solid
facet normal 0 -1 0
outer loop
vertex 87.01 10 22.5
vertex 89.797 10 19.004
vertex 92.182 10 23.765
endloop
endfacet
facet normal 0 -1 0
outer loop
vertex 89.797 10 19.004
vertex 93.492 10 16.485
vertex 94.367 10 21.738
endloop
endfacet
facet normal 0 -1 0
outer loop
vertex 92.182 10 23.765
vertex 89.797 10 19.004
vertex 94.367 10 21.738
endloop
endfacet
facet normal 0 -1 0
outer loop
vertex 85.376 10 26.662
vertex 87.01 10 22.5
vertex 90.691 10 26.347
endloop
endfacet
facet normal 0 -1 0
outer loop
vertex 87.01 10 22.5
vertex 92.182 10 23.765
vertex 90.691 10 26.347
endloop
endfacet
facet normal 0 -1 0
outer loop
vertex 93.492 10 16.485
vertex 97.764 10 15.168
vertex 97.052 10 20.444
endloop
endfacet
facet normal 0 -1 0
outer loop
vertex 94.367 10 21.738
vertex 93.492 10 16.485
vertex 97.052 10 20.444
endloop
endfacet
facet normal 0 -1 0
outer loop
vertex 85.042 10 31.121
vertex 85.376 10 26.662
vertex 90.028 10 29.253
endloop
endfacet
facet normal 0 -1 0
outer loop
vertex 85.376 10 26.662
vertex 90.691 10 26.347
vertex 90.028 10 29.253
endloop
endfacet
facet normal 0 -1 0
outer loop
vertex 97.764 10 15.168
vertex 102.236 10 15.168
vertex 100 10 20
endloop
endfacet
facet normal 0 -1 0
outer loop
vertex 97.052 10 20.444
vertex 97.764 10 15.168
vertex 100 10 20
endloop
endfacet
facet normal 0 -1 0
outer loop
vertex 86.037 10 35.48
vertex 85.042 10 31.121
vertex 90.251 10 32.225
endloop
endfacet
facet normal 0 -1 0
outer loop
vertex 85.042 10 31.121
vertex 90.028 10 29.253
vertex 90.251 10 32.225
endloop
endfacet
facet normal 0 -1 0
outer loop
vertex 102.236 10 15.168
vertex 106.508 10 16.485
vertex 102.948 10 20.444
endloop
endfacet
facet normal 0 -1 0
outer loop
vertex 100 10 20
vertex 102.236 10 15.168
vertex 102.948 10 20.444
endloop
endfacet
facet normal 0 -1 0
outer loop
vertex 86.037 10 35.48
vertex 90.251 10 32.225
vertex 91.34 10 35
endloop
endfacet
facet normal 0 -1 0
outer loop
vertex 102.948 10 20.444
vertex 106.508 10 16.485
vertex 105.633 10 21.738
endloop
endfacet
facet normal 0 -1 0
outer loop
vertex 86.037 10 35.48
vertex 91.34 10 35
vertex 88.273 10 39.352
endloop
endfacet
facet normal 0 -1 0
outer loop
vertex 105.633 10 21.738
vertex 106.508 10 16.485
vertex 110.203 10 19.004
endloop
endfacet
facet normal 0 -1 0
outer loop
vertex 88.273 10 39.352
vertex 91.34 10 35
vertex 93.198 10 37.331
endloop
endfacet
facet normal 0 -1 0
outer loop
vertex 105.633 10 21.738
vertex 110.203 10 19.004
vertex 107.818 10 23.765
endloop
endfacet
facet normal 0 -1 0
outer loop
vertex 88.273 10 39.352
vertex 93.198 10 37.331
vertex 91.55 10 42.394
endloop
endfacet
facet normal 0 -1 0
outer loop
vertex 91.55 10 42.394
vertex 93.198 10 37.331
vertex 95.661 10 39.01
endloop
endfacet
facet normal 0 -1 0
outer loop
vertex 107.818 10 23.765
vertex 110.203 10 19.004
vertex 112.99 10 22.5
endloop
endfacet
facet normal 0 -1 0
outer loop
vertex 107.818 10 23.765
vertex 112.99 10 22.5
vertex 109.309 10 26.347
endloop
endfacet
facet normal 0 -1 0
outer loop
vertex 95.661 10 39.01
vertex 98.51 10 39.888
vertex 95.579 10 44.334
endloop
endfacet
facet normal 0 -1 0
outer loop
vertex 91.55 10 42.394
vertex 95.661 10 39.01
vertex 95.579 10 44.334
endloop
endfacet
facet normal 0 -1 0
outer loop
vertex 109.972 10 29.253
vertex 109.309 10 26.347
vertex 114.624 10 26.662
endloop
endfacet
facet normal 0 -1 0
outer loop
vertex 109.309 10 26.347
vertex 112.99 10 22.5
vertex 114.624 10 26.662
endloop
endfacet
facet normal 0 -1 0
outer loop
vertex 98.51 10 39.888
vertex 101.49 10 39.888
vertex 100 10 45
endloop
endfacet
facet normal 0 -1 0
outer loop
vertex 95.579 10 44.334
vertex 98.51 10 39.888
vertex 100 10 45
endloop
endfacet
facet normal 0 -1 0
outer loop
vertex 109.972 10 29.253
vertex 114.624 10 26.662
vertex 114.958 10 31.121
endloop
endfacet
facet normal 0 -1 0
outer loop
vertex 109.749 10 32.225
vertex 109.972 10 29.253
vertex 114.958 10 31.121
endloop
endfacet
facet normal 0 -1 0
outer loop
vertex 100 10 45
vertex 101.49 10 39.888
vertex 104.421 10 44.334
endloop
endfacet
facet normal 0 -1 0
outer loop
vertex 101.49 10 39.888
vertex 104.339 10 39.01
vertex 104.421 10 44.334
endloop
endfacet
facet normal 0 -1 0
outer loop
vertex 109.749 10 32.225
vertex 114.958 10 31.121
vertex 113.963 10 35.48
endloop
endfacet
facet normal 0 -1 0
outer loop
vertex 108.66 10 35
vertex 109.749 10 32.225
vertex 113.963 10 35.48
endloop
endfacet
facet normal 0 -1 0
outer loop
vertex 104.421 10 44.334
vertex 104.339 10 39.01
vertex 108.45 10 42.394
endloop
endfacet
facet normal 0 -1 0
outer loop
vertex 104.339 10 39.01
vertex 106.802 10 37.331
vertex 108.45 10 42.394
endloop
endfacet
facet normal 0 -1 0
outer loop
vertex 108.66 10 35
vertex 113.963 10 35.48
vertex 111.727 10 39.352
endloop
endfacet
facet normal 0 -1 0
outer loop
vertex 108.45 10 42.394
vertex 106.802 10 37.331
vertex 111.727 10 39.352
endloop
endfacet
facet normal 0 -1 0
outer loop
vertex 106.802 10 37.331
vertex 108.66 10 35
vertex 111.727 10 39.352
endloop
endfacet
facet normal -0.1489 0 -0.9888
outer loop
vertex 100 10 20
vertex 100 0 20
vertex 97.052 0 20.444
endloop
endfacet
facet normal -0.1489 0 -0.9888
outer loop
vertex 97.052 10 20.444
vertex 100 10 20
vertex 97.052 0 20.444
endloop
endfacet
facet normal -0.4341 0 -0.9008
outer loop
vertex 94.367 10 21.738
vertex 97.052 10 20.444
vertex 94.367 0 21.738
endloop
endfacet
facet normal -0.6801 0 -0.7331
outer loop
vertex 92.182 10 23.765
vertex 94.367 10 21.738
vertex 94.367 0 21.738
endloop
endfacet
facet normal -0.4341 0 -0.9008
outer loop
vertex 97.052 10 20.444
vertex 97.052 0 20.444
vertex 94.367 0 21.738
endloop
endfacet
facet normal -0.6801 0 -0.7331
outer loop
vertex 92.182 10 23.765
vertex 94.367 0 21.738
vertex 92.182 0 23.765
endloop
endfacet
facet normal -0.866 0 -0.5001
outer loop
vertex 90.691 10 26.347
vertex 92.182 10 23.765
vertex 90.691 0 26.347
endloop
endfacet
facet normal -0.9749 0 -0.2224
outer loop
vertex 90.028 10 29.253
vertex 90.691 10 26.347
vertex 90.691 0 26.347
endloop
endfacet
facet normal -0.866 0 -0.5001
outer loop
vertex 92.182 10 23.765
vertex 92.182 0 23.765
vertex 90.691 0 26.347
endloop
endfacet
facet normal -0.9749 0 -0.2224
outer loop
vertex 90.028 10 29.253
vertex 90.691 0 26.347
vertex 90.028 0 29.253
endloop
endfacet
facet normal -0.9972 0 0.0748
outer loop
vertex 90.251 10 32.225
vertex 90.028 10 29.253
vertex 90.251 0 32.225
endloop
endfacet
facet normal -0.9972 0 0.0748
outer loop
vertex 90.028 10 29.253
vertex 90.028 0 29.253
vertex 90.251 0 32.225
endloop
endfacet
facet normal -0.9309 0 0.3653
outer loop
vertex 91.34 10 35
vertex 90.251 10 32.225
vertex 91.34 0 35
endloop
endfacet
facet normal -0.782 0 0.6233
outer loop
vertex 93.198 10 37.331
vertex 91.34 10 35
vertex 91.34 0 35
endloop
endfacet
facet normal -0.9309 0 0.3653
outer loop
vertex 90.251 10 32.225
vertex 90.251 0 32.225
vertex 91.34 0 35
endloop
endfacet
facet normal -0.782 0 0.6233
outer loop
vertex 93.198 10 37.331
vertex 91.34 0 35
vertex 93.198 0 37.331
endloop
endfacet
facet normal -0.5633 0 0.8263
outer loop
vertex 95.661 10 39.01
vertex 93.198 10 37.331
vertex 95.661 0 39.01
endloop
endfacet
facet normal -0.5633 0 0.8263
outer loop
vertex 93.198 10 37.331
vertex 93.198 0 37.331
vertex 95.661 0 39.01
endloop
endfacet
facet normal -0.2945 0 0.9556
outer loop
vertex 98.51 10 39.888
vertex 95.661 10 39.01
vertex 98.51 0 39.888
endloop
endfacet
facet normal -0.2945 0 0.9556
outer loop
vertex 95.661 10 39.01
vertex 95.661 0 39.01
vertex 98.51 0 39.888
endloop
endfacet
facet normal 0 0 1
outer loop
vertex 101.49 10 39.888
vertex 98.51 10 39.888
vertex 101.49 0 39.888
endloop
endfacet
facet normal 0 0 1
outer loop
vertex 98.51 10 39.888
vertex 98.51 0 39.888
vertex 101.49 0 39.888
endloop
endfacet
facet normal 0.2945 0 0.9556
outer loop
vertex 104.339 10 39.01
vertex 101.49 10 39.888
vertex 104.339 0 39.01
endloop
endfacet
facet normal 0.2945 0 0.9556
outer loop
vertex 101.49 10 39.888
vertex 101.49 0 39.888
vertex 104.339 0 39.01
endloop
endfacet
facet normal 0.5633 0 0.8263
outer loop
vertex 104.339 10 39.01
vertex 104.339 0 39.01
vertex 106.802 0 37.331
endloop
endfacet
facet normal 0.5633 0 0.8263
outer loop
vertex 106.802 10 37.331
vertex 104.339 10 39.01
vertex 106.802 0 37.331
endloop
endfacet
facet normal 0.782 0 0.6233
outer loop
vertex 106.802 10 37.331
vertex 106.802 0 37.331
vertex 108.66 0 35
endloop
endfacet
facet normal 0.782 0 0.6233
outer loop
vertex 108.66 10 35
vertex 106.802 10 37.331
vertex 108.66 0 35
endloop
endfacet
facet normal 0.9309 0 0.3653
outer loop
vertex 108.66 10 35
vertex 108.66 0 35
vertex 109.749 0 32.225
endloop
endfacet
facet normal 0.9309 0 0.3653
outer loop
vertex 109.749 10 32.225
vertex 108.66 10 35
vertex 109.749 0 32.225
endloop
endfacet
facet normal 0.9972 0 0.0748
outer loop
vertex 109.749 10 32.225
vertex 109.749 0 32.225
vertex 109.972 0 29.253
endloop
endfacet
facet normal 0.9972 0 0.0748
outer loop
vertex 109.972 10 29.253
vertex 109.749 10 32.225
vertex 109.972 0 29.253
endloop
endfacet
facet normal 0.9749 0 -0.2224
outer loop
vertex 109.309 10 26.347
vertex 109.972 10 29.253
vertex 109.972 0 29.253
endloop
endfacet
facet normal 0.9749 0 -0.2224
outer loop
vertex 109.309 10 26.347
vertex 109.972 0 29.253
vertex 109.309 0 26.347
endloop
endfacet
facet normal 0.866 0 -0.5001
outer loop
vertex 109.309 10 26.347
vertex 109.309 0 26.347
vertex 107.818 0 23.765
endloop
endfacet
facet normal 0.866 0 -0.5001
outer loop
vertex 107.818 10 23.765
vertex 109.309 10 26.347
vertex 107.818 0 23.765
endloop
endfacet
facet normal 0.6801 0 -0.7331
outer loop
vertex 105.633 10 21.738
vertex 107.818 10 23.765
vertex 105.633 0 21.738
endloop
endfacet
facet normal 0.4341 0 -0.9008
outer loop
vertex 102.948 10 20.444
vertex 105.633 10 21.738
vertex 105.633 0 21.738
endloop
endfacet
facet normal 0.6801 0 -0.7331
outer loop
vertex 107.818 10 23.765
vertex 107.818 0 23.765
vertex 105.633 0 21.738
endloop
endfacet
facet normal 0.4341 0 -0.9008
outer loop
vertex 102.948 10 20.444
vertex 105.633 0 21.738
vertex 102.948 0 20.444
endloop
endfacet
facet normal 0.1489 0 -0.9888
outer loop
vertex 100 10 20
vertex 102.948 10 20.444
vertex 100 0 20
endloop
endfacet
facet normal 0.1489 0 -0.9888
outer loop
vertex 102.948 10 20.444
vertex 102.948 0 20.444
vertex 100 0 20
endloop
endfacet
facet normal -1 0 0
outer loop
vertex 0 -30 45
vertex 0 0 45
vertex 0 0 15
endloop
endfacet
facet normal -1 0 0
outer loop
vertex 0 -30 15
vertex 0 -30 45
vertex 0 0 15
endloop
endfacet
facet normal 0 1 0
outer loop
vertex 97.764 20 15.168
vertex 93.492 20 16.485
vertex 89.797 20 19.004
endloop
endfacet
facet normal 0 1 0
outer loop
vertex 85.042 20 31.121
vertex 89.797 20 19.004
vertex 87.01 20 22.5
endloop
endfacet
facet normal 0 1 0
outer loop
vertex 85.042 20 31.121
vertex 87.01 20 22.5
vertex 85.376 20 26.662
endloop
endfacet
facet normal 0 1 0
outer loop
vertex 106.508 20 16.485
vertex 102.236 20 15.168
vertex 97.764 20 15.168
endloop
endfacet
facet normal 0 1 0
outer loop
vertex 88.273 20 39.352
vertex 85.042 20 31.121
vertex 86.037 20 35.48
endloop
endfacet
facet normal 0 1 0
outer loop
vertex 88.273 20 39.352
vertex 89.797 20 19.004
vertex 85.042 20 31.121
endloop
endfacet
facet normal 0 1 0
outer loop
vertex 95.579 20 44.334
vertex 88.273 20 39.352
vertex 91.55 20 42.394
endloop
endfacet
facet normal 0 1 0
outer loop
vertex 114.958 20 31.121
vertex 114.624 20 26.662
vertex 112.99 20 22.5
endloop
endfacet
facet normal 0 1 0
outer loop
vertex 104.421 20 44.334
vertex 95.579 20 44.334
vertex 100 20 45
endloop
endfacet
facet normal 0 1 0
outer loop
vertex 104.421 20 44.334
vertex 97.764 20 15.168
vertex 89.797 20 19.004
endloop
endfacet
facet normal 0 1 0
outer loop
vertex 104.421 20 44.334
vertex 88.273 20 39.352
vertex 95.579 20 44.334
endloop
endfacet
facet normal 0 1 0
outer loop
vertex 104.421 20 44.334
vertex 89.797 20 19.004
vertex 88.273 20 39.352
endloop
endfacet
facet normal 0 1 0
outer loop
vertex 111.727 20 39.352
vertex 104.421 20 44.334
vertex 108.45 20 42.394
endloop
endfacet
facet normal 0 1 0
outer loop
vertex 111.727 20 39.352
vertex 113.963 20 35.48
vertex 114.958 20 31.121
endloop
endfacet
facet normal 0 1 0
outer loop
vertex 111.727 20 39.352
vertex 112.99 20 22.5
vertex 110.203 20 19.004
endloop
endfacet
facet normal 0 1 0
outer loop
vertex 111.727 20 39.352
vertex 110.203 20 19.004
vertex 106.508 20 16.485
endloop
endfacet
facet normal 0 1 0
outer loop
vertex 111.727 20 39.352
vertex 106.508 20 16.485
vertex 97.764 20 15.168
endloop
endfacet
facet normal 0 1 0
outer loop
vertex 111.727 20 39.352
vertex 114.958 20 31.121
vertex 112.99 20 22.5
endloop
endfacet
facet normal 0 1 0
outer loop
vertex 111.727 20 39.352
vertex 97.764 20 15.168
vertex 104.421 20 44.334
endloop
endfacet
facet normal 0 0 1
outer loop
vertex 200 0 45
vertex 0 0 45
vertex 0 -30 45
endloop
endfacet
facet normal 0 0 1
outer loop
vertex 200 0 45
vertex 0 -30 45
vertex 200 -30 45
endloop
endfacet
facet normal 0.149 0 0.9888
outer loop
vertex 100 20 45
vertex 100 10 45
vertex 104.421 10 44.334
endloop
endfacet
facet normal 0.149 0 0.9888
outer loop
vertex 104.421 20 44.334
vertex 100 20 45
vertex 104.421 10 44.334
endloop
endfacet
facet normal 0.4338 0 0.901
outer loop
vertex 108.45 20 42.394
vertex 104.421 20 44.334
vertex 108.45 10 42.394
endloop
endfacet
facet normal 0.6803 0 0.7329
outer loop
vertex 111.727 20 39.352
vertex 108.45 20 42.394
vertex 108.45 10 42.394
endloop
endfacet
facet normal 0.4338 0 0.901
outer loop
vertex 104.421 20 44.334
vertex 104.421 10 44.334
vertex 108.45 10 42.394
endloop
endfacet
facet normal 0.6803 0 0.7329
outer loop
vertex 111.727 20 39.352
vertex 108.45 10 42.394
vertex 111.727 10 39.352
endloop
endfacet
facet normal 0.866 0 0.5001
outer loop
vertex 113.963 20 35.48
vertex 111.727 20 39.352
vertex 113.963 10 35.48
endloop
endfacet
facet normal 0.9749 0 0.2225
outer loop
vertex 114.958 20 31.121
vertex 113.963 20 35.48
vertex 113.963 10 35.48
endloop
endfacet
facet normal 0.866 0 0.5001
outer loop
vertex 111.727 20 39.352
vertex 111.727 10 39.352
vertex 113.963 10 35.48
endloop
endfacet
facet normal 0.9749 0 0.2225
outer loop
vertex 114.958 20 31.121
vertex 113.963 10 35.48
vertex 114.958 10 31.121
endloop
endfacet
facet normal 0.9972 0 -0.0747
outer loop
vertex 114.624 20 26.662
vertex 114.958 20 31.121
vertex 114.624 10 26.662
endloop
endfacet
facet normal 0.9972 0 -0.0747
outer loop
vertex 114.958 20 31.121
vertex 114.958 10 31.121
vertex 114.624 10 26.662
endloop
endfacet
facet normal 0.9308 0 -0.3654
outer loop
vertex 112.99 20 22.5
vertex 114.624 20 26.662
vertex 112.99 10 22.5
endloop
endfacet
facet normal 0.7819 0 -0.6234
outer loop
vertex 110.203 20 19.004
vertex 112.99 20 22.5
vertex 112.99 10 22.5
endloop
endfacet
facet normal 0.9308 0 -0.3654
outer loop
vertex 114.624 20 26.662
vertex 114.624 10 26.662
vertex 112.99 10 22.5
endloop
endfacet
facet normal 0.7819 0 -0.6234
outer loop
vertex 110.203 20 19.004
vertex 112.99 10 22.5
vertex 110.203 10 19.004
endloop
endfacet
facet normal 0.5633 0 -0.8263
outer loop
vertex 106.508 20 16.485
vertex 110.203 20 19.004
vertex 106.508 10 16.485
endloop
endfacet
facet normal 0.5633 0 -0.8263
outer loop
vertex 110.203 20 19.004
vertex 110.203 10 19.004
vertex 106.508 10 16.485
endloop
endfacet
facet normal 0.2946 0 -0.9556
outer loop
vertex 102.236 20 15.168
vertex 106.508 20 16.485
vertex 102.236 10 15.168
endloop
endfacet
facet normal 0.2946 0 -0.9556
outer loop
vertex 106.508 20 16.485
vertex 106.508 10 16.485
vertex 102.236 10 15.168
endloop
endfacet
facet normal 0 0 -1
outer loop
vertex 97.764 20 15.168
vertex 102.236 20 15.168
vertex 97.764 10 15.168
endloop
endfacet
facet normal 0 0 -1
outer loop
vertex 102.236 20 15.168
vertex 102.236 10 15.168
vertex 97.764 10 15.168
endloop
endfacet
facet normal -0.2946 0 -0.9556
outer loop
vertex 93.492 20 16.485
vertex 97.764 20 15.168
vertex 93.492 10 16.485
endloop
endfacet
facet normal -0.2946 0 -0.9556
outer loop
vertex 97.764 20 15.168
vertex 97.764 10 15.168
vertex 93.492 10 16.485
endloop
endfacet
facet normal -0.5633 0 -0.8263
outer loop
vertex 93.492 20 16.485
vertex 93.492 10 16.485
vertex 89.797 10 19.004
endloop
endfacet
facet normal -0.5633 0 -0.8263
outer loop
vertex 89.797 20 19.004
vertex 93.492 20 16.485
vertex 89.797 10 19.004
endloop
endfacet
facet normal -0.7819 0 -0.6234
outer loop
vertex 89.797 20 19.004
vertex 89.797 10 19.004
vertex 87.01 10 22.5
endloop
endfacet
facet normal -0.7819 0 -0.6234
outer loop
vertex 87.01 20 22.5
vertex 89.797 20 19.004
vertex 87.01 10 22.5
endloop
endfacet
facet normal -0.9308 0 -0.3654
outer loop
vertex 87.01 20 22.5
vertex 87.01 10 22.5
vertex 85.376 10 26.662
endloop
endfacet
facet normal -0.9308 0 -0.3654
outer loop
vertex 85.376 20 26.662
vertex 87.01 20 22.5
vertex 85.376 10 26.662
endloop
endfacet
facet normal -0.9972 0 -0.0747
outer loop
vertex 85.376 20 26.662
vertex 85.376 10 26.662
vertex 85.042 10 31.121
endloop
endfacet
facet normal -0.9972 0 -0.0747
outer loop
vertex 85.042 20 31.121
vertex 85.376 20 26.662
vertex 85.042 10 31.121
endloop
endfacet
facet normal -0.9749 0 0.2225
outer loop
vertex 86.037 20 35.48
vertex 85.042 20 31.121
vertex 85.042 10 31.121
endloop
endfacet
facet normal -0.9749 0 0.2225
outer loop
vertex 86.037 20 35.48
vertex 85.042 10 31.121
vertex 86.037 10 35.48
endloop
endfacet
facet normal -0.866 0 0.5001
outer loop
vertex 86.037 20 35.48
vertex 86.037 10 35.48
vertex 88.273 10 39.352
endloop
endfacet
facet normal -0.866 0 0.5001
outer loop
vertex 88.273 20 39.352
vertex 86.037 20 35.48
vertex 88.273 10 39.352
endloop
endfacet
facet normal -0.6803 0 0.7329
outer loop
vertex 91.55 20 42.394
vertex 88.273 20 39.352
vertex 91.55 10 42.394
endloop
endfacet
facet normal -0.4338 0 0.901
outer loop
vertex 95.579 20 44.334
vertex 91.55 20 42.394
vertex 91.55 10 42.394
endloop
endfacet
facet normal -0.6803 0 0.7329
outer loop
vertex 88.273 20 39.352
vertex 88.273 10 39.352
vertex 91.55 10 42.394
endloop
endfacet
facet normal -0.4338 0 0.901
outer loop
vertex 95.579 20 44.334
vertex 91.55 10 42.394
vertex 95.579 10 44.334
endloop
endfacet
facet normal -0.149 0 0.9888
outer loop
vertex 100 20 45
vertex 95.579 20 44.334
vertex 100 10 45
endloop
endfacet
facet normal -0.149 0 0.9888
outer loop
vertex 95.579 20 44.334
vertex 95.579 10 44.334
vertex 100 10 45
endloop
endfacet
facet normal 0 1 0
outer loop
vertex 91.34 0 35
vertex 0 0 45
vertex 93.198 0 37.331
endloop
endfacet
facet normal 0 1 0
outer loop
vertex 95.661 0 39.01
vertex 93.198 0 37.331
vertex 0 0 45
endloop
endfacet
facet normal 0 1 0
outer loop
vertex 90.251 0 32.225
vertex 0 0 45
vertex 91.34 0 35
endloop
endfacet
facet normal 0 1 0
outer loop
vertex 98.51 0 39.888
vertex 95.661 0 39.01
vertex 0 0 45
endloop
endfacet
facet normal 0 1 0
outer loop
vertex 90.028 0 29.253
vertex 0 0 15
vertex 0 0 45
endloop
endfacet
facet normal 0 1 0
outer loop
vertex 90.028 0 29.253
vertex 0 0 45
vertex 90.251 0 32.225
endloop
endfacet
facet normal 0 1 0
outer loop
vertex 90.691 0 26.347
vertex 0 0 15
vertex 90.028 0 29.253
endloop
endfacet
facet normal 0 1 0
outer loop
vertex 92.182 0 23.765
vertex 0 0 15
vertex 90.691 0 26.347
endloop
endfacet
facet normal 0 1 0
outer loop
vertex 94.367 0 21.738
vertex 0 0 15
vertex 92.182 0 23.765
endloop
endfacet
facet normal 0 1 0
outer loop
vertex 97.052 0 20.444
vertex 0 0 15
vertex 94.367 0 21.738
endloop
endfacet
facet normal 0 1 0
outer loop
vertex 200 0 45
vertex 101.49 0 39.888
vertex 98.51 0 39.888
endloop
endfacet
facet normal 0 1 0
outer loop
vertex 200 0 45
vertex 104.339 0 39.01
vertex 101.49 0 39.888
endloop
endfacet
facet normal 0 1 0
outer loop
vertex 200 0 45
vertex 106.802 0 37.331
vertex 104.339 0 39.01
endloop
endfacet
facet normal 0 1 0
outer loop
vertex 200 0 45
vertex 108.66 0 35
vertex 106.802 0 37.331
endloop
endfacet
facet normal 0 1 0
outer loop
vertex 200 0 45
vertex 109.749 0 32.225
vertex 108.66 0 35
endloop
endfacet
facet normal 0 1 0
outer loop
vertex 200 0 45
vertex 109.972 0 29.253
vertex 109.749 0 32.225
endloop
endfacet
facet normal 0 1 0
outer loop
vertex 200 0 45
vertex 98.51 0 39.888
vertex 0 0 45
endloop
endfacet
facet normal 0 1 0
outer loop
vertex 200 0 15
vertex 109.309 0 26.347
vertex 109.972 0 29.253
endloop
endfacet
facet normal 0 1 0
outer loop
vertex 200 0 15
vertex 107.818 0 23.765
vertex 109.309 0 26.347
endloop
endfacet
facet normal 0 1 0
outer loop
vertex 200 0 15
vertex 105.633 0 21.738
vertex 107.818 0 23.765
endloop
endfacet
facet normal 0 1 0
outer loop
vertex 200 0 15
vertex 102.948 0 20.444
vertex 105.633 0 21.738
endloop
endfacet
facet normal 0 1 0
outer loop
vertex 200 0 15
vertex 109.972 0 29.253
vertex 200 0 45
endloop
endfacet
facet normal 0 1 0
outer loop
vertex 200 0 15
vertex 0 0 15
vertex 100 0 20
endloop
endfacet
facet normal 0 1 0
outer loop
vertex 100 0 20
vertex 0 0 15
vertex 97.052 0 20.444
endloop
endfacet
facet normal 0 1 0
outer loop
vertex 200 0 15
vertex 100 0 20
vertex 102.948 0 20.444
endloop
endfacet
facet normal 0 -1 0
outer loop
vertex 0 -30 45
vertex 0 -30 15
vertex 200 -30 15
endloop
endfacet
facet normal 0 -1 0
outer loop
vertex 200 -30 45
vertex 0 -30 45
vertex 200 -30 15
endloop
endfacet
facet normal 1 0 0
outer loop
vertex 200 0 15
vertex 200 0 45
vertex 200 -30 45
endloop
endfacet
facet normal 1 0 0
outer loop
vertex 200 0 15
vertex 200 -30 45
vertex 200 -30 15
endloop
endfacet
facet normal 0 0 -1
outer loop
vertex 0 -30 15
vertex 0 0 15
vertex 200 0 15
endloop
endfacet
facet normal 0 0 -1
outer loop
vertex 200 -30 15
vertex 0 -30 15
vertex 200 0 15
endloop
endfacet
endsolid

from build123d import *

# Parameters (mm, degrees)
SKETCH1_W           = 200
SKETCH1_H           = 60
BOSS_EXTRUDE1_DEPTH = 30
SKETCH2_R           = 10
BOSS_EXTRUDE3_DEPTH = 10
SKETCH3_R           = 15
BOSS_EXTRUDE4_DEPTH = 10
SKETCH4_W           = 200
SKETCH4_H           = 15
CUT_EXTRUDE1_DEPTH  = 50


with BuildPart() as part:
    # Sketch1 → Boss-Extrude1 (new body)
    with BuildSketch(Plane(origin=(0, 0, 0), x_dir=(1, 0, 0), z_dir=(0, 1, 0))):
        with Locations((100, -30)):
            Rectangle(SKETCH1_W, SKETCH1_H)
    extrude(amount=-BOSS_EXTRUDE1_DEPTH)

    # Sketch2 → Boss-Extrude3 (add)
    with BuildSketch(Plane(origin=(0, 0, 0), x_dir=(1, 0, 0), z_dir=(0, 1, 0))):
        with Locations(Location((100, -30, 0), (0, 0, 90))):
            Circle(SKETCH2_R)
    extrude(amount=BOSS_EXTRUDE3_DEPTH)

    # Sketch3 → Boss-Extrude4 (add)
    with BuildSketch(Plane(origin=(0, 10, 0), x_dir=(1, 0, 0), z_dir=(0, 1, 0))):
        with Locations(Location((100, -30, 0), (0, 0, 270))):
            Circle(SKETCH3_R)
    extrude(amount=BOSS_EXTRUDE4_DEPTH)

    # Sketch4 → Cut-Extrude1 (cut)
    with BuildSketch(Plane(origin=(0, 0, 0), x_dir=(1, 0, 0), z_dir=(0, 1, 0))):
        with Locations((100, -7.5)):
            Rectangle(SKETCH4_W, SKETCH4_H)
        with Locations((100, -52.5)):
            Rectangle(SKETCH4_W, SKETCH4_H)
    extrude(amount=-CUT_EXTRUDE1_DEPTH, mode=Mode.SUBTRACT)


solid = part.part
